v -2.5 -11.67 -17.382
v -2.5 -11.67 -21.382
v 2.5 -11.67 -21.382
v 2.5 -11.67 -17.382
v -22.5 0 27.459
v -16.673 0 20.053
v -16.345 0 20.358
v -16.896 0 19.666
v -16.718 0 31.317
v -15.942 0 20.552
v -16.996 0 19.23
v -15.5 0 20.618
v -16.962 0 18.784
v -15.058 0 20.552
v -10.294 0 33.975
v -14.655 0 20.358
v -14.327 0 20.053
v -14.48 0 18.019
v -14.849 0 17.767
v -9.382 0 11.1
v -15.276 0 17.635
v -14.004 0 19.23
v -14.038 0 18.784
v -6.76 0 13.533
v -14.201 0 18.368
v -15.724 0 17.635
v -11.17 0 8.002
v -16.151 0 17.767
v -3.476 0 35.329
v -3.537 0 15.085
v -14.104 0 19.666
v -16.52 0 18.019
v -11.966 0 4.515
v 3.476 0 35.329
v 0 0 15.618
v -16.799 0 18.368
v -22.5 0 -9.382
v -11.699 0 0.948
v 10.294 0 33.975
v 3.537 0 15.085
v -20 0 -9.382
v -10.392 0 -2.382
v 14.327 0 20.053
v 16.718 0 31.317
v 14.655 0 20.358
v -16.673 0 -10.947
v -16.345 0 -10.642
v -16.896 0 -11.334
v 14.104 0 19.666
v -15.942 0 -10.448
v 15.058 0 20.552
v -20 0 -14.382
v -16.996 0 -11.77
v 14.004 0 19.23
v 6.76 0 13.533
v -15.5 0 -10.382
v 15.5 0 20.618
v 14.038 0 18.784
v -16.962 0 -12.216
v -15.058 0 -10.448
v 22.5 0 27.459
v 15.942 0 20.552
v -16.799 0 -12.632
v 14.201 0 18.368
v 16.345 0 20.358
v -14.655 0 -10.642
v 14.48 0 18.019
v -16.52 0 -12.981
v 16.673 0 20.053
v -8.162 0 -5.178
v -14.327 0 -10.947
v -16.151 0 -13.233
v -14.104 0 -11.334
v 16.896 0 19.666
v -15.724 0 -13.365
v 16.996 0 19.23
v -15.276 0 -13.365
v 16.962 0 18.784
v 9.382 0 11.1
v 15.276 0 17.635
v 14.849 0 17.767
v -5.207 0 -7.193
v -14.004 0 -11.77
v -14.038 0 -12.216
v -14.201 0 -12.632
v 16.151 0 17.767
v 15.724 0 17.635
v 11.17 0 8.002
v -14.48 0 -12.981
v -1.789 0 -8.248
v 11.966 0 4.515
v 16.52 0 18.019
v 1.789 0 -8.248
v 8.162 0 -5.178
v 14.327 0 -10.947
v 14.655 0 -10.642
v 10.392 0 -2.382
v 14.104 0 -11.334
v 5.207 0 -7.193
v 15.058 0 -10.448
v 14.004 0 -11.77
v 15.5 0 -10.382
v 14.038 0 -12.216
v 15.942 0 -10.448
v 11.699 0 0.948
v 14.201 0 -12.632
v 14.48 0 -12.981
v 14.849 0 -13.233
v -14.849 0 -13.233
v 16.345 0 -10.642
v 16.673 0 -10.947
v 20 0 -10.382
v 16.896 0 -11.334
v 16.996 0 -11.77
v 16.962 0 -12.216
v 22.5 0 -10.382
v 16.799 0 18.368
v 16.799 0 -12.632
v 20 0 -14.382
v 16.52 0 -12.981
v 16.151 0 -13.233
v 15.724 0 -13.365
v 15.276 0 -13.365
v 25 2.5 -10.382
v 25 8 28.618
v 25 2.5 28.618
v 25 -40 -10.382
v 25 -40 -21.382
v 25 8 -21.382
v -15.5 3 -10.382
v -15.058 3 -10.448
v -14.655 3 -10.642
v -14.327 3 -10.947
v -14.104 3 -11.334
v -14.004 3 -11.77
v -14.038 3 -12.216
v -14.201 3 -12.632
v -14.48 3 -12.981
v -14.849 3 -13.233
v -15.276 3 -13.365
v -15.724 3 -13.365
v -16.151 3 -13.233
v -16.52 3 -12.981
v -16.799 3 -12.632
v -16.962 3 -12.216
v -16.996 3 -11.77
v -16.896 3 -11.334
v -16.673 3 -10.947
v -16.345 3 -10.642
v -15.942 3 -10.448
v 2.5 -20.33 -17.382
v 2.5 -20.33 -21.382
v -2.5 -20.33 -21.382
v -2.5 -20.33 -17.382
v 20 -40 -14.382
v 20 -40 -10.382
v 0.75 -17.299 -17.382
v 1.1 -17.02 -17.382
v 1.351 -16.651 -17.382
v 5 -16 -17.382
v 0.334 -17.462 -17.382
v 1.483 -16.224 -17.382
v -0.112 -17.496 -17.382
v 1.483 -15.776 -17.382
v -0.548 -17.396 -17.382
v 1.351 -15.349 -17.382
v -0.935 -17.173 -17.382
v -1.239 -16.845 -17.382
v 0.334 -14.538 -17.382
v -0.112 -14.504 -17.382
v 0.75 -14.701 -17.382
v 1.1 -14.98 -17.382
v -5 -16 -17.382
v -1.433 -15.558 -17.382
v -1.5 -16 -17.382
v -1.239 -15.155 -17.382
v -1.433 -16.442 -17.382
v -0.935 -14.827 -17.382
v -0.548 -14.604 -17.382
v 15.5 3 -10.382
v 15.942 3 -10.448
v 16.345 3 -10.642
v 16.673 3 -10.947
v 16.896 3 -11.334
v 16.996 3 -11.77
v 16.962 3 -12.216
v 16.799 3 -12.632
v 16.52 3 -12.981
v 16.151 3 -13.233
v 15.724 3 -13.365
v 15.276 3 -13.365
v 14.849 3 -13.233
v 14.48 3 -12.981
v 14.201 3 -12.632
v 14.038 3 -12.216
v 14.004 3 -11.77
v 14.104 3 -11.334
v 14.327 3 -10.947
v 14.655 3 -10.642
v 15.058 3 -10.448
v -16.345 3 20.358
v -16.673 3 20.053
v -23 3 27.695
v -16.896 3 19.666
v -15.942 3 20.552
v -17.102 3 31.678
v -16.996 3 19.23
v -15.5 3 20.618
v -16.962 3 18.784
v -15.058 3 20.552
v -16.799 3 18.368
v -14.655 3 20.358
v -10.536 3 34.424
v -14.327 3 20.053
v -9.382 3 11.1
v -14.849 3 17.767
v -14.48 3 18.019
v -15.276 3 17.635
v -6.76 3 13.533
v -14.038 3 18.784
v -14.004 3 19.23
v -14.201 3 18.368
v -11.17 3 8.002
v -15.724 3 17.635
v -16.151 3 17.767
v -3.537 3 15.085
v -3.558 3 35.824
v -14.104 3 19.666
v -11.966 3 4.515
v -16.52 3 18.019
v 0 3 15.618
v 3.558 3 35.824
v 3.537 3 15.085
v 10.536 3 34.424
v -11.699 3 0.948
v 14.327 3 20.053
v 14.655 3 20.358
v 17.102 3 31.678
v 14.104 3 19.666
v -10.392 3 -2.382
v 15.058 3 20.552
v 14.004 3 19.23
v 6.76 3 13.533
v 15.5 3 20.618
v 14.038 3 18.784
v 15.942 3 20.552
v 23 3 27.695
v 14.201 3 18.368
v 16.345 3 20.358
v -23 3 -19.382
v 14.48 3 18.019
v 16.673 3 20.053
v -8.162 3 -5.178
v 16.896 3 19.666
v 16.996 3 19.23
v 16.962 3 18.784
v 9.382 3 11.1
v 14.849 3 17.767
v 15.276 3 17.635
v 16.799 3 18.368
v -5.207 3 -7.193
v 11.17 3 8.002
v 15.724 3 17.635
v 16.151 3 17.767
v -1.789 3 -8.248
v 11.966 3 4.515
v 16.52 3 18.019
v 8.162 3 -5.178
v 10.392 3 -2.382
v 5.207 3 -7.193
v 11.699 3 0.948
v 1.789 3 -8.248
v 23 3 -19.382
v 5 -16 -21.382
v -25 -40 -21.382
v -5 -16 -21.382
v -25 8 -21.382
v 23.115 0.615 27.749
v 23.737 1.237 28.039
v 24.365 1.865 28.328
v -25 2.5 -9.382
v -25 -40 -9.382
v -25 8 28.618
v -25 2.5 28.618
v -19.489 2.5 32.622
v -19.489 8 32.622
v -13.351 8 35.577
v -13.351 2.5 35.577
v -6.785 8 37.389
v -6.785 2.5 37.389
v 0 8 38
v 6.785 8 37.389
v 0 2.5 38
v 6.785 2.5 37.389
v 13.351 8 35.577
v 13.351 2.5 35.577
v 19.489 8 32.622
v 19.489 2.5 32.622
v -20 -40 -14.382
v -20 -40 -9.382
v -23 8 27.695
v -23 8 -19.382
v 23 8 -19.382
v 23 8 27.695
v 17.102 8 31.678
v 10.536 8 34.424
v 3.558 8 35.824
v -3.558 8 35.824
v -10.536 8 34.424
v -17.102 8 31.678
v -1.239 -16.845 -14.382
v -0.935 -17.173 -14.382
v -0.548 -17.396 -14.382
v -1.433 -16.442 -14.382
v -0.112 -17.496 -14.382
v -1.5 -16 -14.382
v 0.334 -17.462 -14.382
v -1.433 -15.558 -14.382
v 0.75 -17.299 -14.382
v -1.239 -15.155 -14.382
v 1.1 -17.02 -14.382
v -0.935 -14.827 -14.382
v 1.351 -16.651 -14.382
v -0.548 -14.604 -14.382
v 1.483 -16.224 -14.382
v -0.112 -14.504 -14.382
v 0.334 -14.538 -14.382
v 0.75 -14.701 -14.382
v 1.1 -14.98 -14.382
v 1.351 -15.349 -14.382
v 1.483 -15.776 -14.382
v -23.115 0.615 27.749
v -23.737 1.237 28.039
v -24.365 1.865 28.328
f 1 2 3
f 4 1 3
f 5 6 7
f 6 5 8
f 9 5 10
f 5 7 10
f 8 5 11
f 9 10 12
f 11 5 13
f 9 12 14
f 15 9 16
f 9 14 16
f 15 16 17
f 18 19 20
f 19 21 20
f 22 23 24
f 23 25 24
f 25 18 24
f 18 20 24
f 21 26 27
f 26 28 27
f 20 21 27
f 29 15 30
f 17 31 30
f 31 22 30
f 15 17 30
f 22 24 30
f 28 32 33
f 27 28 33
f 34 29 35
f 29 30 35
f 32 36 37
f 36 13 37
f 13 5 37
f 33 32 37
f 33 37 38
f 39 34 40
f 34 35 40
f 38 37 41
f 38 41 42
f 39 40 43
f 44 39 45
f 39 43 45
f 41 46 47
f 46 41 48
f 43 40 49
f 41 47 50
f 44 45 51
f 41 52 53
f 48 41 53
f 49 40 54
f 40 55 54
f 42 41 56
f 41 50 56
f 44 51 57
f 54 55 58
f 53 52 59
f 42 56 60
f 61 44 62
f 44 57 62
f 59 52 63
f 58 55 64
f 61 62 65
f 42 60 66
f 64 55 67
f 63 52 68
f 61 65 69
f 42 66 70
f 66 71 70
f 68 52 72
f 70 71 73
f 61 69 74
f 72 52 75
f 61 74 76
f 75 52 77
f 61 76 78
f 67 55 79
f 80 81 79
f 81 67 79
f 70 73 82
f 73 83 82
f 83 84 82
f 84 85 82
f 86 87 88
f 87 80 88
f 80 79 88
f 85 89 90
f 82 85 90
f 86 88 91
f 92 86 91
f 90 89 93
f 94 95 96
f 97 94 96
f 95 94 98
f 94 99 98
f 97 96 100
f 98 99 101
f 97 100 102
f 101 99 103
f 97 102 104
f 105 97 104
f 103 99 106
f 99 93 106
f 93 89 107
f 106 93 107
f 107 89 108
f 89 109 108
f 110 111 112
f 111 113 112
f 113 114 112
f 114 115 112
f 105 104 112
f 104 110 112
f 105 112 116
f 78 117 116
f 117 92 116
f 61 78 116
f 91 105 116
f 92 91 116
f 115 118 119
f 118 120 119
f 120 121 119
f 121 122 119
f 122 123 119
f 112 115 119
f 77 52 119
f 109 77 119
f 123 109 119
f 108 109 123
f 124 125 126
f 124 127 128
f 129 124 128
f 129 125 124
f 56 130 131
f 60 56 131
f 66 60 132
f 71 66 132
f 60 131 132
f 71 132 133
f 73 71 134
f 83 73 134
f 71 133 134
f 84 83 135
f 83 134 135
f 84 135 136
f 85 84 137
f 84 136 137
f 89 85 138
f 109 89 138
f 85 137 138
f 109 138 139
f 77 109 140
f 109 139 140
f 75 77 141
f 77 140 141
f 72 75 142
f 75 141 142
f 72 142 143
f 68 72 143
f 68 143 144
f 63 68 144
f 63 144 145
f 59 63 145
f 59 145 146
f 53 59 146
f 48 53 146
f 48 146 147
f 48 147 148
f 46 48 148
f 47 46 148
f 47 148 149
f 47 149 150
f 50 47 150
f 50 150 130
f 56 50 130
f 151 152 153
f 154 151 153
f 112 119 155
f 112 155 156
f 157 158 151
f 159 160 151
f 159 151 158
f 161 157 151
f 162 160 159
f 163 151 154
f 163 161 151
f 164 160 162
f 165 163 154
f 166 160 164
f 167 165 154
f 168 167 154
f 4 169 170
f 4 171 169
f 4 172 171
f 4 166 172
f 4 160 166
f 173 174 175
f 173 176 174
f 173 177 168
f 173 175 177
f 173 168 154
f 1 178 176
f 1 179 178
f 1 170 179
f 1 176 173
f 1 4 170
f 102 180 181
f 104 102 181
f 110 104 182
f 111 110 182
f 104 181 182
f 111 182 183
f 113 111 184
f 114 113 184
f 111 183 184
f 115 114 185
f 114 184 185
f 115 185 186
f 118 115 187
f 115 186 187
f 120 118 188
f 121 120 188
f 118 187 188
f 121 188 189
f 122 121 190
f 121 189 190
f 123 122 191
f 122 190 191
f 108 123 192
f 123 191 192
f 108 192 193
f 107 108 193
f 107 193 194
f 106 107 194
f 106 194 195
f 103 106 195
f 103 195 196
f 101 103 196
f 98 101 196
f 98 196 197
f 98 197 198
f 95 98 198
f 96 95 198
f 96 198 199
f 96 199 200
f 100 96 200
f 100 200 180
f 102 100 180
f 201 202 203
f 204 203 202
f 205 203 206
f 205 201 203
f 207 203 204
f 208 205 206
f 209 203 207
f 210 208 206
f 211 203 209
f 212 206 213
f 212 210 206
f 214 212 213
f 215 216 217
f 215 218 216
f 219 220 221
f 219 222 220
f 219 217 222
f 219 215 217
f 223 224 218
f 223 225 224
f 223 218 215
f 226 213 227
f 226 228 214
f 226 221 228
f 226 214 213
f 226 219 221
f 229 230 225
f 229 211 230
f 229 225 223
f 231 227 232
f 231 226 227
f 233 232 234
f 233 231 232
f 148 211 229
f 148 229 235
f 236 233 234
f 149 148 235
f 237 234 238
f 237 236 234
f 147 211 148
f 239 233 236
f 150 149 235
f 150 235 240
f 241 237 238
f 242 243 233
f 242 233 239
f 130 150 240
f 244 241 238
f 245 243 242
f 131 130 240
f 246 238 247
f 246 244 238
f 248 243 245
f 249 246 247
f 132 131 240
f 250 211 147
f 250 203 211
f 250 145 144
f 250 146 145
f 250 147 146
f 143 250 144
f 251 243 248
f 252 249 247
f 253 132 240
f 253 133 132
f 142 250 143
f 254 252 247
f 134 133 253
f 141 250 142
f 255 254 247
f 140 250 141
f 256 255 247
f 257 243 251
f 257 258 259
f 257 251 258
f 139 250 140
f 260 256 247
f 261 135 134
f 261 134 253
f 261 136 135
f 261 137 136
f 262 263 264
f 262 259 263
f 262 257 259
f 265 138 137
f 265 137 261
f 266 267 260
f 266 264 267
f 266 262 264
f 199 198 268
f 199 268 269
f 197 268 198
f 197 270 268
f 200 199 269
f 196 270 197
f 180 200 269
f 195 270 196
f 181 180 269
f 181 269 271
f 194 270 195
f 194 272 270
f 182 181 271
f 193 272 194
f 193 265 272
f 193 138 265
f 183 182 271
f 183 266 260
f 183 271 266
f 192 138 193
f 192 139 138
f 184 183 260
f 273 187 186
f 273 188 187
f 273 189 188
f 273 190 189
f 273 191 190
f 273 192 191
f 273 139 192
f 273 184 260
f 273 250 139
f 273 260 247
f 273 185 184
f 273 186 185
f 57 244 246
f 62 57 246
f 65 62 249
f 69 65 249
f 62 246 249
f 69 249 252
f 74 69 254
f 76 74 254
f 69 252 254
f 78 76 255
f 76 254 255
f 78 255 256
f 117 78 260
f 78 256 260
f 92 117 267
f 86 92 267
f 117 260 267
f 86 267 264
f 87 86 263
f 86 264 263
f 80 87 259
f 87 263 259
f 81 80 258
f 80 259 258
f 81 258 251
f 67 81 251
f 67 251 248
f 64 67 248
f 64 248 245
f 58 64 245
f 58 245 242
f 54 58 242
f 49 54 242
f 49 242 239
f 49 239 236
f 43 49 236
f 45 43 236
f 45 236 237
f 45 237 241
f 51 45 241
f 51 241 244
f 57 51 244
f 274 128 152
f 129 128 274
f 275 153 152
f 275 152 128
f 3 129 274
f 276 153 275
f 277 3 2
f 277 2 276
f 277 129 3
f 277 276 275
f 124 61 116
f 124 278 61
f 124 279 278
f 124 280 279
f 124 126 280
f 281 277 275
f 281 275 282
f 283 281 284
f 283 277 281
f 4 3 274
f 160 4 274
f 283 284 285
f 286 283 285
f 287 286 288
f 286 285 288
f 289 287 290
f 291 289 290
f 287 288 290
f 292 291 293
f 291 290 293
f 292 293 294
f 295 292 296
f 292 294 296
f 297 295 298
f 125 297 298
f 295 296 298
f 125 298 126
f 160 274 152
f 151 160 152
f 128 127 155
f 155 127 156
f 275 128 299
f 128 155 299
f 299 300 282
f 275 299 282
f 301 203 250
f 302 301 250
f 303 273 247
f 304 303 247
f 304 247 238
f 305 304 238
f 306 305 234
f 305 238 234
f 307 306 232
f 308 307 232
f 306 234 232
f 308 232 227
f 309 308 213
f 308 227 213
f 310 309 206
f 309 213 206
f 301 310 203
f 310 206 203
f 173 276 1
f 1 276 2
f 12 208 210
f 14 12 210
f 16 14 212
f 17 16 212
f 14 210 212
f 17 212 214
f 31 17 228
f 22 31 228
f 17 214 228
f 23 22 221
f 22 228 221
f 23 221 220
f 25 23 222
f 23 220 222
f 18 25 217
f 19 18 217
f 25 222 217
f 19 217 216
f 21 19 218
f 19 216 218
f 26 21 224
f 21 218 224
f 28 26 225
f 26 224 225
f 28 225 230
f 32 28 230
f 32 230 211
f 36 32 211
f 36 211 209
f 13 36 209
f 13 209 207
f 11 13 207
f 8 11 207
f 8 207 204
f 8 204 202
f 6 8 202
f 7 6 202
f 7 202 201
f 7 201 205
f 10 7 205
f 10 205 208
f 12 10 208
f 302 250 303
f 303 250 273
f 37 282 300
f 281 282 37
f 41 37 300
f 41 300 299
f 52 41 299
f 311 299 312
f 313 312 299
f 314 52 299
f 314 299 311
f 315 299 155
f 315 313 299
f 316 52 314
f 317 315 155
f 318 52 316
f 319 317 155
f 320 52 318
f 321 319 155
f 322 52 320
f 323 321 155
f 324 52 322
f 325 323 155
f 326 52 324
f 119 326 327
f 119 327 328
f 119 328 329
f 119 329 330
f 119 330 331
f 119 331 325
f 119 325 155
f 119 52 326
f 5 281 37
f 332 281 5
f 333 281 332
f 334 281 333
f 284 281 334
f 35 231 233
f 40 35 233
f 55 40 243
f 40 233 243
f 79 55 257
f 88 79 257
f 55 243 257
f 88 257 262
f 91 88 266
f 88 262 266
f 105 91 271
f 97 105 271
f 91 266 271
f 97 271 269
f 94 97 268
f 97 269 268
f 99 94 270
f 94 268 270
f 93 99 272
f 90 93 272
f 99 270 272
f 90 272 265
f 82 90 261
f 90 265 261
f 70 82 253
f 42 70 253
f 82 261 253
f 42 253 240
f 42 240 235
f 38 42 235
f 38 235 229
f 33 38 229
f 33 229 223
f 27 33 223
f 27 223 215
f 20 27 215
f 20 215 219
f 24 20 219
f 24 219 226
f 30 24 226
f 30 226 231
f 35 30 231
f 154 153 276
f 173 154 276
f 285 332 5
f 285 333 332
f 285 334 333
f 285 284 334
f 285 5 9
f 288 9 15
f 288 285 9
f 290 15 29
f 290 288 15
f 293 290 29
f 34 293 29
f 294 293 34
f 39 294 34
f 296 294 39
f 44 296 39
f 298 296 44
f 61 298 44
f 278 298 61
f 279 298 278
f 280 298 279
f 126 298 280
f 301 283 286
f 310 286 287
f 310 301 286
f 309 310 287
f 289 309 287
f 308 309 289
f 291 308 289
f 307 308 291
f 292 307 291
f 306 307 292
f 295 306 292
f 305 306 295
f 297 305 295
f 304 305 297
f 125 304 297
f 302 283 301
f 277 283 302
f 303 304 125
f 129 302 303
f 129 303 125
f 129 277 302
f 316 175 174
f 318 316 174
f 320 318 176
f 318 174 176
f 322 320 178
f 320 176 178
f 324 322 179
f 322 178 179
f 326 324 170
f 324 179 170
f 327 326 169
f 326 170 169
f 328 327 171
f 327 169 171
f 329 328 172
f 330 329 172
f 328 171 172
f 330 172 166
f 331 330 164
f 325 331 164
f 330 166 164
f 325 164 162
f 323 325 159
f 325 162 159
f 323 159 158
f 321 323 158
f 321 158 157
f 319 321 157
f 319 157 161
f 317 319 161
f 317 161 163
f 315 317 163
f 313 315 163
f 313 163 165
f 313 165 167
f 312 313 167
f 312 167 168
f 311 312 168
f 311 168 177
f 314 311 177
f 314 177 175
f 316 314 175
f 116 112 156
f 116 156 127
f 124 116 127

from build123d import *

# Parameters (mm, degrees)
EXTRUDE_1_DEPTH      = 3
SKETCH_28_R          = 12
SKETCH_28_R_2        = 1.5
CUT_EXTRUDE_9_DEPTH  = 4
EXTRUDE_11_DEPTH     = 5
EXTRUDE_14_DEPTH     = 40
CUT_EXTRUDE_12_DEPTH = 4
SKETCH_34_R          = 1.5
CUT_EXTRUDE_13_DEPTH = 4
CHAMFER_1_SIZE       = 2.5
CHAMFER_2_SIZE       = 2.5
CHAMFER_3_SIZE       = 2.5


with BuildPart() as part:
    # 草图1 → 凸台-拉伸1 (new body)
    with BuildSketch(Plane(origin=(0, 0, 0), x_dir=(1, 0, 0), z_dir=(0, 1, 0))):
        with BuildLine():
            Line((-25, 21.381823957), (-25, -28.618176043))
            ThreePointArc((-25, -28.618176043), (0, -38), (25, -28.618176043))
            Line((25, -28.618176043), (25, 21.381823957))
            Line((25, 21.381823957), (-25, 21.381823957))
        make_face()
    extrude(amount=EXTRUDE_1_DEPTH)

    # 草图28 → 切除-拉伸9 (cut)
    with BuildSketch(Plane(origin=(0, 3, 0), x_dir=(1, 0, 0), z_dir=(0, 1, 0))):
        with Locations(Location((0, -3.618176043, 0), (0, 0, 270))):
            Circle(SKETCH_28_R)
        with Locations(Location((-15.5, 11.881823957, 0), (0, 0, 270))):
            Circle(SKETCH_28_R_2)
        with Locations(Location((-15.5, -19.118176043, 0), (0, 0, 270))):
            Circle(SKETCH_28_R_2)
        with Locations(Location((15.5, 11.881823957, 0), (0, 0, 270))):
            Circle(SKETCH_28_R_2)
        with Locations(Location((15.5, -19.118176043, 0), (0, 0, 270))):
            Circle(SKETCH_28_R_2)
    extrude(amount=-CUT_EXTRUDE_9_DEPTH, mode=Mode.SUBTRACT)

    # 草图30 → 凸台-拉伸11 (add)
    with BuildSketch(Plane(origin=(0, 3, 0), x_dir=(1, 0, 0), z_dir=(0, 1, 0))):
        with BuildLine():
            ThreePointArc((-25, -28.618176043), (0, -38), (25, -28.618176043))
            Line((25, -28.618176043), (25, 21.381823957))
            Line((25, 21.381823957), (-25, 21.381823957))
            Line((-25, 21.381823957), (-25, -28.618176043))
        make_face()
        with BuildLine():
            ThreePointArc((23, -27.694764848), (0, -36), (-23, -27.694764848))
            Line((-23, -27.694764848), (-23, 19.381823957))
            Line((-23, 19.381823957), (23, 19.381823957))
            Line((23, 19.381823957), (23, -27.694764848))
        make_face(mode=Mode.SUBTRACT)
    extrude(amount=EXTRUDE_11_DEPTH)

    # 草图32 → 凸台-拉伸14 (add)
    with BuildSketch(Plane.XZ):
        Polygon((-25, -21.381823957), (-25, -9.381823957), (-20, -9.381823957), (-20, -14.381823957), (20, -14.381823957), (20, -10.381823957), (25, -10.381823957), (25, -21.381823957), align=None)
    extrude(amount=EXTRUDE_14_DEPTH)

    # 草图33 → 切除-拉伸12 (cut)
    with BuildSketch(Plane(origin=(0, 0, -21.381823957), x_dir=(-1, 0, 0), z_dir=(0, 0, -1))):
        Polygon((0, -20.330127019), (0, -11.669872981), (-2.5, -11.669872981), (-5, -16), (-2.5, -20.330127019), align=None)
        Polygon((2.5, -11.669872981), (0, -11.669872981), (0, -20.330127019), (2.5, -20.330127019), (5, -16), align=None)
    extrude(amount=-CUT_EXTRUDE_12_DEPTH, mode=Mode.SUBTRACT)

    # 草图34 → 切除-拉伸13 (cut)
    with BuildSketch(Plane(origin=(0, 0, -17.381823957), x_dir=(-1, 0, 0), z_dir=(0, 0, -1))):
        with Locations((0, -16)):
            Circle(SKETCH_34_R)
    extrude(amount=-CUT_EXTRUDE_13_DEPTH, mode=Mode.SUBTRACT)

    # 倒角1
    chamfer_1_edges = [part.edges().sort_by_distance(p)[0] for p in [
        (25, 0, 9.118176043),
    ]]
    chamfer(chamfer_1_edges, length=CHAMFER_1_SIZE)

    # 倒角2
    chamfer_2_edges = [part.edges().sort_by_distance(p)[0] for p in [
        (-25, 0, 9.618176043),
    ]]
    chamfer(chamfer_2_edges, length=CHAMFER_2_SIZE)

    # 倒角3
    chamfer_3_edges = [part.edges().sort_by_distance(p)[0] for p in [
        (0, 0, 38),
    ]]
    chamfer(chamfer_3_edges, length=CHAMFER_3_SIZE)


solid = part.part
